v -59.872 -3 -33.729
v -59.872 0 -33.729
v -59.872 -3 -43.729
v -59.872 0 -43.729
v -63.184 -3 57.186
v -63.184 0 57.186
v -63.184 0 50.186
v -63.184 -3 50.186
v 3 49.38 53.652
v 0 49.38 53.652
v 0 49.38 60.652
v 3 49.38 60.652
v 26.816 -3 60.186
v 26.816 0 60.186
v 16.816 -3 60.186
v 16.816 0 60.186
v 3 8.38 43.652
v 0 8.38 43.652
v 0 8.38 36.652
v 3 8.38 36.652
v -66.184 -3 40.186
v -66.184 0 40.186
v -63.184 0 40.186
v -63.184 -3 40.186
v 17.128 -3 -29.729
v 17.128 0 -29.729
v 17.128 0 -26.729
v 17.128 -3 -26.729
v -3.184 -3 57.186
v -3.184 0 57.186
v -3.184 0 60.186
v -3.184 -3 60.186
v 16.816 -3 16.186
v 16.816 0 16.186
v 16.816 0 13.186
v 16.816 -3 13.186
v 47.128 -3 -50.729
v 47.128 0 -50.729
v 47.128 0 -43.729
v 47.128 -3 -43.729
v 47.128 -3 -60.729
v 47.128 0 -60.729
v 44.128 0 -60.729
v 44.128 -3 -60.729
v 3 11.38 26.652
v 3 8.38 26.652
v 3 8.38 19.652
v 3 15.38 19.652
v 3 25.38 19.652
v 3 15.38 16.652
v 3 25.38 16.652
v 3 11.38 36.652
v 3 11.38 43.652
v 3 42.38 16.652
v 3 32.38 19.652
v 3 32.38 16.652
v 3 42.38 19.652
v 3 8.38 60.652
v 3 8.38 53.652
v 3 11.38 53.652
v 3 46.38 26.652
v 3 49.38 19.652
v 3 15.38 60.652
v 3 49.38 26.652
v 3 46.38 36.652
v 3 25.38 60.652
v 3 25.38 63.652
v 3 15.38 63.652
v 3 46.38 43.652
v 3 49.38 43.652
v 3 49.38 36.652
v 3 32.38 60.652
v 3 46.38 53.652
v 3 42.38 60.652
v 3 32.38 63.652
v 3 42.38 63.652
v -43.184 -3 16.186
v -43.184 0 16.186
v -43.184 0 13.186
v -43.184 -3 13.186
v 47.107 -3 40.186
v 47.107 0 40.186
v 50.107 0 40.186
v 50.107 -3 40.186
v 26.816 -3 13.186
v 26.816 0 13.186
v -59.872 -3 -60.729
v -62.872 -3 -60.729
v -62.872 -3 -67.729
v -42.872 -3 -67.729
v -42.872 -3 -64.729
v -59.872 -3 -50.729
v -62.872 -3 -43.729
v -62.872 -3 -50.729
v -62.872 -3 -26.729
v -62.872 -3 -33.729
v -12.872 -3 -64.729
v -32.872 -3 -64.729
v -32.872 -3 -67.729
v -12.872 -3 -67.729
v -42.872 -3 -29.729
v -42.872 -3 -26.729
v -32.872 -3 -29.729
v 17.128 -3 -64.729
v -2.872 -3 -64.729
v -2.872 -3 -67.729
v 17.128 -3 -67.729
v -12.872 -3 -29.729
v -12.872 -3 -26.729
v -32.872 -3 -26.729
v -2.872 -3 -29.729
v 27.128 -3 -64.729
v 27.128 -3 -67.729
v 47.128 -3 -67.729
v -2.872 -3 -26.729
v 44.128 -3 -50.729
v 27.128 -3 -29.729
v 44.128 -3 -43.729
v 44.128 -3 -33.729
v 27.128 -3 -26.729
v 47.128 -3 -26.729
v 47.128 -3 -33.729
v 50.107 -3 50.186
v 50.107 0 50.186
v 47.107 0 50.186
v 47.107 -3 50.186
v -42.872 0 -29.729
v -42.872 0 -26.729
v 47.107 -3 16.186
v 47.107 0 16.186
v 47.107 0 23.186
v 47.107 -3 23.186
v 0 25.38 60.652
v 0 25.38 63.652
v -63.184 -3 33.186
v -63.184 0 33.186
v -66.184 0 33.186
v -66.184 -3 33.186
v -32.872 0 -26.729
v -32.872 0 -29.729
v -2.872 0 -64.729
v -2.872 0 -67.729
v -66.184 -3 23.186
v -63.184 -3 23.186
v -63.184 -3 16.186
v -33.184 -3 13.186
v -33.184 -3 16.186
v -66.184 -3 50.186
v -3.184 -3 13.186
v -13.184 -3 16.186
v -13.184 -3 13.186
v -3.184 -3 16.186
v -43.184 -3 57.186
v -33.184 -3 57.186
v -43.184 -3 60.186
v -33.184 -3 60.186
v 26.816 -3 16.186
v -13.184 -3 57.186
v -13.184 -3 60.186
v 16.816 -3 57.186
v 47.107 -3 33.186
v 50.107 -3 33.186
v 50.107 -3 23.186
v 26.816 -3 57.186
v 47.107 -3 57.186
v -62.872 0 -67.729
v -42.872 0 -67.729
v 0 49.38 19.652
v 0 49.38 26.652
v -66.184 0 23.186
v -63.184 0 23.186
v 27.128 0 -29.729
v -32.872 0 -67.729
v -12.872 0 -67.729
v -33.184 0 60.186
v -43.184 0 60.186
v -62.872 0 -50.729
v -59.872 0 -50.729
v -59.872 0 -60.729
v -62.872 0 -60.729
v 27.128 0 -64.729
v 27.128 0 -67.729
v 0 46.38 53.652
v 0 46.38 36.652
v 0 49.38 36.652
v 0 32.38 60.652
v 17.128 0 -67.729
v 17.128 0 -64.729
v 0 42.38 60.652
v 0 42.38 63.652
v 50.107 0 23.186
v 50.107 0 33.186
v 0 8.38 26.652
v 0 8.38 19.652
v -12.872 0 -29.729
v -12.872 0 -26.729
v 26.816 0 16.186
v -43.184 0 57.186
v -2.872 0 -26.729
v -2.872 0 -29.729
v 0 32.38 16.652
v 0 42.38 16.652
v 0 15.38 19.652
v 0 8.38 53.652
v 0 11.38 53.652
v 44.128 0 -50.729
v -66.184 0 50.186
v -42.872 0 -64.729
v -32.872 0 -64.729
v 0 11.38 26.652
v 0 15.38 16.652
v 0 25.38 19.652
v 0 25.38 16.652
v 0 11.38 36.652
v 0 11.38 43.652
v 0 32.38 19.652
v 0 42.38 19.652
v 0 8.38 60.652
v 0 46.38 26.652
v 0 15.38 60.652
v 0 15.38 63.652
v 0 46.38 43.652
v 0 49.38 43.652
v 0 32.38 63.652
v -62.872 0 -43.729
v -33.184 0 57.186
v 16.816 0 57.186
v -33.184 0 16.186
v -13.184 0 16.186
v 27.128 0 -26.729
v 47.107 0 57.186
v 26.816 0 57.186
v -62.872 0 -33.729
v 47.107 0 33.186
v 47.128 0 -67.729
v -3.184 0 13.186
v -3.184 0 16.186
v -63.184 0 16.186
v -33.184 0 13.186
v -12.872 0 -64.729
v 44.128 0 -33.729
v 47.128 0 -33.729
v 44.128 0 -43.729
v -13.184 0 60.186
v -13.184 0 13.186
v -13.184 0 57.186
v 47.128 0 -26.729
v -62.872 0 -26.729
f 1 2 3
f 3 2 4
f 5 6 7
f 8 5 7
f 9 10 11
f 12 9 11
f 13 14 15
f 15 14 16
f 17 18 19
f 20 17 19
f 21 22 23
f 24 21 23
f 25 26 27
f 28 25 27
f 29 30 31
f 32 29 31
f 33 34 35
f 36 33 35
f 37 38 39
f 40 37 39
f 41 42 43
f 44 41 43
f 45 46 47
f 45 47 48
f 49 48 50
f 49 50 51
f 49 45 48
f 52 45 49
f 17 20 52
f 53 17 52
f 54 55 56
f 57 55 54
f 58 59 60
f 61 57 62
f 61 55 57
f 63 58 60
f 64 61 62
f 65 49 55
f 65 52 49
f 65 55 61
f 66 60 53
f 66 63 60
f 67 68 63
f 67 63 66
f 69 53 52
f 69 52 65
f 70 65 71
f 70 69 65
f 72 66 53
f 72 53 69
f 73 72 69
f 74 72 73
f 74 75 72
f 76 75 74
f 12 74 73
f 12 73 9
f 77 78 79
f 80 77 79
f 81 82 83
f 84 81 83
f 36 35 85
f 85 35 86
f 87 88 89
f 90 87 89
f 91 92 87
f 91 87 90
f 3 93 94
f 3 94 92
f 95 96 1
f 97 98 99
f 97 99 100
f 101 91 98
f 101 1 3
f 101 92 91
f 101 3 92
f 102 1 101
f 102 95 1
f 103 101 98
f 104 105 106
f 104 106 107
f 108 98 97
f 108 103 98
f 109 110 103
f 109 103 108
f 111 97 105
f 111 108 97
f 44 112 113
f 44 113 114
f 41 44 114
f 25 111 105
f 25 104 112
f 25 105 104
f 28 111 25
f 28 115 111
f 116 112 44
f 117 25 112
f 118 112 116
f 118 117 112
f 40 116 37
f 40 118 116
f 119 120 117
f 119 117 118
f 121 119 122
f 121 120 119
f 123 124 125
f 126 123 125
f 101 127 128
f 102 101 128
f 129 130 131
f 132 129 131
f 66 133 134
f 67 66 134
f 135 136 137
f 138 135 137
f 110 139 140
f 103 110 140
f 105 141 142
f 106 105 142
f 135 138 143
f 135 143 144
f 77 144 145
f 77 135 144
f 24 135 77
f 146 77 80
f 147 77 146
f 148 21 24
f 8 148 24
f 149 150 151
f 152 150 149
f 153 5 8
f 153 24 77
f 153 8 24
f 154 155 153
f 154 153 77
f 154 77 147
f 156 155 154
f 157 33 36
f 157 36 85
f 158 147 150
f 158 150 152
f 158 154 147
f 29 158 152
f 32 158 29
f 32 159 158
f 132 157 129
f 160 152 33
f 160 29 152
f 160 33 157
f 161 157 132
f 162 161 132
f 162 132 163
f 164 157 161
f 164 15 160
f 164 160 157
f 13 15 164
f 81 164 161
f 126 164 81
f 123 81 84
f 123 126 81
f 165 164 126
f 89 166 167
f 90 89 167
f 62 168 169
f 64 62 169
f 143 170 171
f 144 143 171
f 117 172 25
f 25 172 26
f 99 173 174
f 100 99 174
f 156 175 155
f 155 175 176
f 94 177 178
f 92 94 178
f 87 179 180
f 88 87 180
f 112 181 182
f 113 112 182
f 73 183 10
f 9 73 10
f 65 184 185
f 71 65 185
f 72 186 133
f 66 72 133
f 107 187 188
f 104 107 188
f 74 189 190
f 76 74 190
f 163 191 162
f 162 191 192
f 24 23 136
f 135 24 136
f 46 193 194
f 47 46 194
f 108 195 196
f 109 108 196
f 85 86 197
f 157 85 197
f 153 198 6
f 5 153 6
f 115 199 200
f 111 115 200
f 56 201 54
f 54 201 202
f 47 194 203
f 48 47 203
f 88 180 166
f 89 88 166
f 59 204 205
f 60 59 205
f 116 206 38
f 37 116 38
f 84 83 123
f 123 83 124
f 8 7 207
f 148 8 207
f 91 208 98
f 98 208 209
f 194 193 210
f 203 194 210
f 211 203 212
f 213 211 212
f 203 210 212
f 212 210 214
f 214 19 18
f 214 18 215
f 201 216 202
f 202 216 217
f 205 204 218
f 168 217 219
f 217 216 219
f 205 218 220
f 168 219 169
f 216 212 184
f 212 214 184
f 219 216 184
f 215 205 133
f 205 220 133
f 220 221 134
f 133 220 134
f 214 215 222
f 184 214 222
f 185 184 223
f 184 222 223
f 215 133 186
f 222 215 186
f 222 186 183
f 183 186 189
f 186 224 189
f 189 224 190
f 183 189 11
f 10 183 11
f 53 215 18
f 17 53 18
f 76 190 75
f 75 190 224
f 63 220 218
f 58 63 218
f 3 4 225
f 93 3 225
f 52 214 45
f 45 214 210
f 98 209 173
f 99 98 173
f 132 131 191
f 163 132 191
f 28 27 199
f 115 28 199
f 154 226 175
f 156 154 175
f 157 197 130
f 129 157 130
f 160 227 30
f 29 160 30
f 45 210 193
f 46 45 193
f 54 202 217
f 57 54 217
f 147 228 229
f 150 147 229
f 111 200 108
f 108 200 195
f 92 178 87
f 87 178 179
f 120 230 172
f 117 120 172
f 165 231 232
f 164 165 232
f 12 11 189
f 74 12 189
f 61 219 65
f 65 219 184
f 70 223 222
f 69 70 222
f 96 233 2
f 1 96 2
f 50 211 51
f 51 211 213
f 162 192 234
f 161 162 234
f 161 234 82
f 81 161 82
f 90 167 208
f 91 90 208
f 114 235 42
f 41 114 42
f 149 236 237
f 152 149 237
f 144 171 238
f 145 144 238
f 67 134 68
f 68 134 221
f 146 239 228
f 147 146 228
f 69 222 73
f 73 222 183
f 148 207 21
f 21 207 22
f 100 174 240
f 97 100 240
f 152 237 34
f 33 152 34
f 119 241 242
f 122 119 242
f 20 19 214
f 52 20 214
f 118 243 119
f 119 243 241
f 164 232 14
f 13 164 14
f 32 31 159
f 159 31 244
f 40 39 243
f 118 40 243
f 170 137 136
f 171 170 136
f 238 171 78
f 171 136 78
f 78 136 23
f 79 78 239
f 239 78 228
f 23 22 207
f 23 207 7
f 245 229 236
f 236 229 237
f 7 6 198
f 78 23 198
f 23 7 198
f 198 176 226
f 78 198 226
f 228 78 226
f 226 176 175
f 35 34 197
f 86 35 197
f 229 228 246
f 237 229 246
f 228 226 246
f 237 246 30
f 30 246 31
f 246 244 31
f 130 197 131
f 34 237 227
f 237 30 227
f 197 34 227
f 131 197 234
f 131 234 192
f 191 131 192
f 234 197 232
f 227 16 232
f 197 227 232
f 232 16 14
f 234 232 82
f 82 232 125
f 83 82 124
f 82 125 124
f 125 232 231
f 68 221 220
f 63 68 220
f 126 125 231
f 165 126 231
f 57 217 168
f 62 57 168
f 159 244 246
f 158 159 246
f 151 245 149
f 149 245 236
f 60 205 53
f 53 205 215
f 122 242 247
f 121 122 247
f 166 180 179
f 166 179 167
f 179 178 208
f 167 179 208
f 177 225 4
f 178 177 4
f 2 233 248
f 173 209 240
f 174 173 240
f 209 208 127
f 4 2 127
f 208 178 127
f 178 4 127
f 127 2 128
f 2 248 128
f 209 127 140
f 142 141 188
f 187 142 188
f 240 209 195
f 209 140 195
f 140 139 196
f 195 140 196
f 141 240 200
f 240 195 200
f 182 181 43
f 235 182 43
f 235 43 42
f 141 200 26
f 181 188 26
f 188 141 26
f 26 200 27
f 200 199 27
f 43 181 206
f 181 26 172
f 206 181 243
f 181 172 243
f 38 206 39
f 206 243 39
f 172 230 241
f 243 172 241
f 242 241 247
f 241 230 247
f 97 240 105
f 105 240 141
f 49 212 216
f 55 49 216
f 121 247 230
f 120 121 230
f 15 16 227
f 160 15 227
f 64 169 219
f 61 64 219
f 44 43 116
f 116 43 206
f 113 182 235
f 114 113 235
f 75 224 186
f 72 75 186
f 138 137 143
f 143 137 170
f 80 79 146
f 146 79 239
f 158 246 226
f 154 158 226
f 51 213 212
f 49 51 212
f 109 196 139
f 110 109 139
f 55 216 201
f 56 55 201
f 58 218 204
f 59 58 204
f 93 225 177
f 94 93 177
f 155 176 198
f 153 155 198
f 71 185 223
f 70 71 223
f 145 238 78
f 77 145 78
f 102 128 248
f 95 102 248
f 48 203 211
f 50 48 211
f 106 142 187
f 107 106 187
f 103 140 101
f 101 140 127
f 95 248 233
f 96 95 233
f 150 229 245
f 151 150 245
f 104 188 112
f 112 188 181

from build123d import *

# Parameters (mm, degrees)
F1_DEPTH = 3
F3_DEPTH = 3


with BuildPart() as f1:
    # F0 (on Front) → F1 (new body)
    with BuildSketch(Plane.XZ):
        Polygon((-62.871546, -60.728966), (-62.871546, -67.728966), (-42.871546, -67.728966), (-42.871546, -64.728966), (-32.871546, -64.728966), (-32.871546, -67.728966), (-12.871546, -67.728966), (-12.871546, -64.728966), (-2.871546, -64.728966), (-2.871546, -67.728966), (17.128454, -67.728966), (17.128454, -64.728966), (27.128454, -64.728966), (27.128454, -67.728966), (47.128454, -67.728966), (47.128454, -60.728966), (44.128454, -60.728966), (44.128454, -50.728966), (47.128454, -50.728966), (47.128454, -43.728966), (44.128454, -43.728966), (44.128454, -33.728966), (47.128454, -33.728966), (47.128454, -26.728966), (27.128454, -26.728966), (27.128454, -29.728966), (17.128454, -29.728966), (17.128454, -26.728966), (-2.871546, -26.728966), (-2.871546, -29.728966), (-12.871546, -29.728966), (-12.871546, -26.728966), (-32.871546, -26.728966), (-32.871546, -29.728966), (-42.871546, -29.728966), (-42.871546, -26.728966), (-62.871546, -26.728966), (-62.871546, -33.728966), (-59.871546, -33.728966), (-59.871546, -43.728966), (-62.871546, -43.728966), (-62.871546, -50.728966), (-59.871546, -50.728966), (-59.871546, -60.728966), align=None)
        Polygon((-43.183932, 57.186339), (-63.183932, 57.186339), (-63.183932, 50.186339), (-66.183932, 50.186339), (-66.183932, 40.186339), (-63.183932, 40.186339), (-63.183932, 33.186339), (-66.183932, 33.186339), (-66.183932, 23.186339), (-63.183932, 23.186339), (-63.183932, 16.186339), (-43.183932, 16.186339), (-43.183932, 13.186339), (-33.183932, 13.186339), (-33.183932, 16.186339), (-13.183932, 16.186339), (-13.183932, 13.186339), (-3.183932, 13.186339), (-3.183932, 16.186339), (16.816068, 16.186339), (16.816068, 13.186339), (26.816068, 13.186339), (26.816068, 16.186339), (47.107305, 16.186339), (47.107305, 23.186339), (50.107305, 23.186339), (50.107305, 33.186339), (47.107305, 33.186339), (47.107305, 40.186339), (50.107305, 40.186339), (50.107305, 50.186339), (47.107305, 50.186339), (47.107305, 57.186339), (26.816068, 57.186339), (26.816068, 60.186339), (16.816068, 60.186339), (16.816068, 57.186339), (-3.183932, 57.186339), (-3.183932, 60.186339), (-13.183932, 60.186339), (-13.183932, 57.186339), (-33.183932, 57.186339), (-33.183932, 60.186339), (-43.183932, 60.186339), align=None)
    extrude(amount=F1_DEPTH)


with BuildPart() as f3:
    # F2 (on Right) → F3 (new body)
    with BuildSketch(Plane.YZ):
        Polygon((42.379946, 19.652456), (49.379946, 19.652456), (49.379946, 26.652456), (46.379946, 26.652456), (46.379946, 36.652456), (49.379946, 36.652456), (49.379946, 43.652456), (46.379946, 43.652456), (46.379946, 53.652456), (49.379946, 53.652456), (49.379946, 60.652456), (42.379946, 60.652456), (42.379946, 63.652456), (32.379946, 63.652456), (32.379946, 60.652456), (25.379946, 60.652456), (25.379946, 63.652456), (15.379946, 63.652456), (15.379946, 60.652456), (8.379946, 60.652456), (8.379946, 53.652456), (11.379946, 53.652456), (11.379946, 43.652456), (8.379946, 43.652456), (8.379946, 36.652456), (11.379946, 36.652456), (11.379946, 26.652456), (8.379946, 26.652456), (8.379946, 19.652456), (15.379946, 19.652456), (15.379946, 16.652456), (25.379946, 16.652456), (25.379946, 19.652456), (32.379946, 19.652456), (32.379946, 16.652456), (42.379946, 16.652456), align=None)
    extrude(amount=F3_DEPTH)


solid = Compound([f1.part, f3.part])
